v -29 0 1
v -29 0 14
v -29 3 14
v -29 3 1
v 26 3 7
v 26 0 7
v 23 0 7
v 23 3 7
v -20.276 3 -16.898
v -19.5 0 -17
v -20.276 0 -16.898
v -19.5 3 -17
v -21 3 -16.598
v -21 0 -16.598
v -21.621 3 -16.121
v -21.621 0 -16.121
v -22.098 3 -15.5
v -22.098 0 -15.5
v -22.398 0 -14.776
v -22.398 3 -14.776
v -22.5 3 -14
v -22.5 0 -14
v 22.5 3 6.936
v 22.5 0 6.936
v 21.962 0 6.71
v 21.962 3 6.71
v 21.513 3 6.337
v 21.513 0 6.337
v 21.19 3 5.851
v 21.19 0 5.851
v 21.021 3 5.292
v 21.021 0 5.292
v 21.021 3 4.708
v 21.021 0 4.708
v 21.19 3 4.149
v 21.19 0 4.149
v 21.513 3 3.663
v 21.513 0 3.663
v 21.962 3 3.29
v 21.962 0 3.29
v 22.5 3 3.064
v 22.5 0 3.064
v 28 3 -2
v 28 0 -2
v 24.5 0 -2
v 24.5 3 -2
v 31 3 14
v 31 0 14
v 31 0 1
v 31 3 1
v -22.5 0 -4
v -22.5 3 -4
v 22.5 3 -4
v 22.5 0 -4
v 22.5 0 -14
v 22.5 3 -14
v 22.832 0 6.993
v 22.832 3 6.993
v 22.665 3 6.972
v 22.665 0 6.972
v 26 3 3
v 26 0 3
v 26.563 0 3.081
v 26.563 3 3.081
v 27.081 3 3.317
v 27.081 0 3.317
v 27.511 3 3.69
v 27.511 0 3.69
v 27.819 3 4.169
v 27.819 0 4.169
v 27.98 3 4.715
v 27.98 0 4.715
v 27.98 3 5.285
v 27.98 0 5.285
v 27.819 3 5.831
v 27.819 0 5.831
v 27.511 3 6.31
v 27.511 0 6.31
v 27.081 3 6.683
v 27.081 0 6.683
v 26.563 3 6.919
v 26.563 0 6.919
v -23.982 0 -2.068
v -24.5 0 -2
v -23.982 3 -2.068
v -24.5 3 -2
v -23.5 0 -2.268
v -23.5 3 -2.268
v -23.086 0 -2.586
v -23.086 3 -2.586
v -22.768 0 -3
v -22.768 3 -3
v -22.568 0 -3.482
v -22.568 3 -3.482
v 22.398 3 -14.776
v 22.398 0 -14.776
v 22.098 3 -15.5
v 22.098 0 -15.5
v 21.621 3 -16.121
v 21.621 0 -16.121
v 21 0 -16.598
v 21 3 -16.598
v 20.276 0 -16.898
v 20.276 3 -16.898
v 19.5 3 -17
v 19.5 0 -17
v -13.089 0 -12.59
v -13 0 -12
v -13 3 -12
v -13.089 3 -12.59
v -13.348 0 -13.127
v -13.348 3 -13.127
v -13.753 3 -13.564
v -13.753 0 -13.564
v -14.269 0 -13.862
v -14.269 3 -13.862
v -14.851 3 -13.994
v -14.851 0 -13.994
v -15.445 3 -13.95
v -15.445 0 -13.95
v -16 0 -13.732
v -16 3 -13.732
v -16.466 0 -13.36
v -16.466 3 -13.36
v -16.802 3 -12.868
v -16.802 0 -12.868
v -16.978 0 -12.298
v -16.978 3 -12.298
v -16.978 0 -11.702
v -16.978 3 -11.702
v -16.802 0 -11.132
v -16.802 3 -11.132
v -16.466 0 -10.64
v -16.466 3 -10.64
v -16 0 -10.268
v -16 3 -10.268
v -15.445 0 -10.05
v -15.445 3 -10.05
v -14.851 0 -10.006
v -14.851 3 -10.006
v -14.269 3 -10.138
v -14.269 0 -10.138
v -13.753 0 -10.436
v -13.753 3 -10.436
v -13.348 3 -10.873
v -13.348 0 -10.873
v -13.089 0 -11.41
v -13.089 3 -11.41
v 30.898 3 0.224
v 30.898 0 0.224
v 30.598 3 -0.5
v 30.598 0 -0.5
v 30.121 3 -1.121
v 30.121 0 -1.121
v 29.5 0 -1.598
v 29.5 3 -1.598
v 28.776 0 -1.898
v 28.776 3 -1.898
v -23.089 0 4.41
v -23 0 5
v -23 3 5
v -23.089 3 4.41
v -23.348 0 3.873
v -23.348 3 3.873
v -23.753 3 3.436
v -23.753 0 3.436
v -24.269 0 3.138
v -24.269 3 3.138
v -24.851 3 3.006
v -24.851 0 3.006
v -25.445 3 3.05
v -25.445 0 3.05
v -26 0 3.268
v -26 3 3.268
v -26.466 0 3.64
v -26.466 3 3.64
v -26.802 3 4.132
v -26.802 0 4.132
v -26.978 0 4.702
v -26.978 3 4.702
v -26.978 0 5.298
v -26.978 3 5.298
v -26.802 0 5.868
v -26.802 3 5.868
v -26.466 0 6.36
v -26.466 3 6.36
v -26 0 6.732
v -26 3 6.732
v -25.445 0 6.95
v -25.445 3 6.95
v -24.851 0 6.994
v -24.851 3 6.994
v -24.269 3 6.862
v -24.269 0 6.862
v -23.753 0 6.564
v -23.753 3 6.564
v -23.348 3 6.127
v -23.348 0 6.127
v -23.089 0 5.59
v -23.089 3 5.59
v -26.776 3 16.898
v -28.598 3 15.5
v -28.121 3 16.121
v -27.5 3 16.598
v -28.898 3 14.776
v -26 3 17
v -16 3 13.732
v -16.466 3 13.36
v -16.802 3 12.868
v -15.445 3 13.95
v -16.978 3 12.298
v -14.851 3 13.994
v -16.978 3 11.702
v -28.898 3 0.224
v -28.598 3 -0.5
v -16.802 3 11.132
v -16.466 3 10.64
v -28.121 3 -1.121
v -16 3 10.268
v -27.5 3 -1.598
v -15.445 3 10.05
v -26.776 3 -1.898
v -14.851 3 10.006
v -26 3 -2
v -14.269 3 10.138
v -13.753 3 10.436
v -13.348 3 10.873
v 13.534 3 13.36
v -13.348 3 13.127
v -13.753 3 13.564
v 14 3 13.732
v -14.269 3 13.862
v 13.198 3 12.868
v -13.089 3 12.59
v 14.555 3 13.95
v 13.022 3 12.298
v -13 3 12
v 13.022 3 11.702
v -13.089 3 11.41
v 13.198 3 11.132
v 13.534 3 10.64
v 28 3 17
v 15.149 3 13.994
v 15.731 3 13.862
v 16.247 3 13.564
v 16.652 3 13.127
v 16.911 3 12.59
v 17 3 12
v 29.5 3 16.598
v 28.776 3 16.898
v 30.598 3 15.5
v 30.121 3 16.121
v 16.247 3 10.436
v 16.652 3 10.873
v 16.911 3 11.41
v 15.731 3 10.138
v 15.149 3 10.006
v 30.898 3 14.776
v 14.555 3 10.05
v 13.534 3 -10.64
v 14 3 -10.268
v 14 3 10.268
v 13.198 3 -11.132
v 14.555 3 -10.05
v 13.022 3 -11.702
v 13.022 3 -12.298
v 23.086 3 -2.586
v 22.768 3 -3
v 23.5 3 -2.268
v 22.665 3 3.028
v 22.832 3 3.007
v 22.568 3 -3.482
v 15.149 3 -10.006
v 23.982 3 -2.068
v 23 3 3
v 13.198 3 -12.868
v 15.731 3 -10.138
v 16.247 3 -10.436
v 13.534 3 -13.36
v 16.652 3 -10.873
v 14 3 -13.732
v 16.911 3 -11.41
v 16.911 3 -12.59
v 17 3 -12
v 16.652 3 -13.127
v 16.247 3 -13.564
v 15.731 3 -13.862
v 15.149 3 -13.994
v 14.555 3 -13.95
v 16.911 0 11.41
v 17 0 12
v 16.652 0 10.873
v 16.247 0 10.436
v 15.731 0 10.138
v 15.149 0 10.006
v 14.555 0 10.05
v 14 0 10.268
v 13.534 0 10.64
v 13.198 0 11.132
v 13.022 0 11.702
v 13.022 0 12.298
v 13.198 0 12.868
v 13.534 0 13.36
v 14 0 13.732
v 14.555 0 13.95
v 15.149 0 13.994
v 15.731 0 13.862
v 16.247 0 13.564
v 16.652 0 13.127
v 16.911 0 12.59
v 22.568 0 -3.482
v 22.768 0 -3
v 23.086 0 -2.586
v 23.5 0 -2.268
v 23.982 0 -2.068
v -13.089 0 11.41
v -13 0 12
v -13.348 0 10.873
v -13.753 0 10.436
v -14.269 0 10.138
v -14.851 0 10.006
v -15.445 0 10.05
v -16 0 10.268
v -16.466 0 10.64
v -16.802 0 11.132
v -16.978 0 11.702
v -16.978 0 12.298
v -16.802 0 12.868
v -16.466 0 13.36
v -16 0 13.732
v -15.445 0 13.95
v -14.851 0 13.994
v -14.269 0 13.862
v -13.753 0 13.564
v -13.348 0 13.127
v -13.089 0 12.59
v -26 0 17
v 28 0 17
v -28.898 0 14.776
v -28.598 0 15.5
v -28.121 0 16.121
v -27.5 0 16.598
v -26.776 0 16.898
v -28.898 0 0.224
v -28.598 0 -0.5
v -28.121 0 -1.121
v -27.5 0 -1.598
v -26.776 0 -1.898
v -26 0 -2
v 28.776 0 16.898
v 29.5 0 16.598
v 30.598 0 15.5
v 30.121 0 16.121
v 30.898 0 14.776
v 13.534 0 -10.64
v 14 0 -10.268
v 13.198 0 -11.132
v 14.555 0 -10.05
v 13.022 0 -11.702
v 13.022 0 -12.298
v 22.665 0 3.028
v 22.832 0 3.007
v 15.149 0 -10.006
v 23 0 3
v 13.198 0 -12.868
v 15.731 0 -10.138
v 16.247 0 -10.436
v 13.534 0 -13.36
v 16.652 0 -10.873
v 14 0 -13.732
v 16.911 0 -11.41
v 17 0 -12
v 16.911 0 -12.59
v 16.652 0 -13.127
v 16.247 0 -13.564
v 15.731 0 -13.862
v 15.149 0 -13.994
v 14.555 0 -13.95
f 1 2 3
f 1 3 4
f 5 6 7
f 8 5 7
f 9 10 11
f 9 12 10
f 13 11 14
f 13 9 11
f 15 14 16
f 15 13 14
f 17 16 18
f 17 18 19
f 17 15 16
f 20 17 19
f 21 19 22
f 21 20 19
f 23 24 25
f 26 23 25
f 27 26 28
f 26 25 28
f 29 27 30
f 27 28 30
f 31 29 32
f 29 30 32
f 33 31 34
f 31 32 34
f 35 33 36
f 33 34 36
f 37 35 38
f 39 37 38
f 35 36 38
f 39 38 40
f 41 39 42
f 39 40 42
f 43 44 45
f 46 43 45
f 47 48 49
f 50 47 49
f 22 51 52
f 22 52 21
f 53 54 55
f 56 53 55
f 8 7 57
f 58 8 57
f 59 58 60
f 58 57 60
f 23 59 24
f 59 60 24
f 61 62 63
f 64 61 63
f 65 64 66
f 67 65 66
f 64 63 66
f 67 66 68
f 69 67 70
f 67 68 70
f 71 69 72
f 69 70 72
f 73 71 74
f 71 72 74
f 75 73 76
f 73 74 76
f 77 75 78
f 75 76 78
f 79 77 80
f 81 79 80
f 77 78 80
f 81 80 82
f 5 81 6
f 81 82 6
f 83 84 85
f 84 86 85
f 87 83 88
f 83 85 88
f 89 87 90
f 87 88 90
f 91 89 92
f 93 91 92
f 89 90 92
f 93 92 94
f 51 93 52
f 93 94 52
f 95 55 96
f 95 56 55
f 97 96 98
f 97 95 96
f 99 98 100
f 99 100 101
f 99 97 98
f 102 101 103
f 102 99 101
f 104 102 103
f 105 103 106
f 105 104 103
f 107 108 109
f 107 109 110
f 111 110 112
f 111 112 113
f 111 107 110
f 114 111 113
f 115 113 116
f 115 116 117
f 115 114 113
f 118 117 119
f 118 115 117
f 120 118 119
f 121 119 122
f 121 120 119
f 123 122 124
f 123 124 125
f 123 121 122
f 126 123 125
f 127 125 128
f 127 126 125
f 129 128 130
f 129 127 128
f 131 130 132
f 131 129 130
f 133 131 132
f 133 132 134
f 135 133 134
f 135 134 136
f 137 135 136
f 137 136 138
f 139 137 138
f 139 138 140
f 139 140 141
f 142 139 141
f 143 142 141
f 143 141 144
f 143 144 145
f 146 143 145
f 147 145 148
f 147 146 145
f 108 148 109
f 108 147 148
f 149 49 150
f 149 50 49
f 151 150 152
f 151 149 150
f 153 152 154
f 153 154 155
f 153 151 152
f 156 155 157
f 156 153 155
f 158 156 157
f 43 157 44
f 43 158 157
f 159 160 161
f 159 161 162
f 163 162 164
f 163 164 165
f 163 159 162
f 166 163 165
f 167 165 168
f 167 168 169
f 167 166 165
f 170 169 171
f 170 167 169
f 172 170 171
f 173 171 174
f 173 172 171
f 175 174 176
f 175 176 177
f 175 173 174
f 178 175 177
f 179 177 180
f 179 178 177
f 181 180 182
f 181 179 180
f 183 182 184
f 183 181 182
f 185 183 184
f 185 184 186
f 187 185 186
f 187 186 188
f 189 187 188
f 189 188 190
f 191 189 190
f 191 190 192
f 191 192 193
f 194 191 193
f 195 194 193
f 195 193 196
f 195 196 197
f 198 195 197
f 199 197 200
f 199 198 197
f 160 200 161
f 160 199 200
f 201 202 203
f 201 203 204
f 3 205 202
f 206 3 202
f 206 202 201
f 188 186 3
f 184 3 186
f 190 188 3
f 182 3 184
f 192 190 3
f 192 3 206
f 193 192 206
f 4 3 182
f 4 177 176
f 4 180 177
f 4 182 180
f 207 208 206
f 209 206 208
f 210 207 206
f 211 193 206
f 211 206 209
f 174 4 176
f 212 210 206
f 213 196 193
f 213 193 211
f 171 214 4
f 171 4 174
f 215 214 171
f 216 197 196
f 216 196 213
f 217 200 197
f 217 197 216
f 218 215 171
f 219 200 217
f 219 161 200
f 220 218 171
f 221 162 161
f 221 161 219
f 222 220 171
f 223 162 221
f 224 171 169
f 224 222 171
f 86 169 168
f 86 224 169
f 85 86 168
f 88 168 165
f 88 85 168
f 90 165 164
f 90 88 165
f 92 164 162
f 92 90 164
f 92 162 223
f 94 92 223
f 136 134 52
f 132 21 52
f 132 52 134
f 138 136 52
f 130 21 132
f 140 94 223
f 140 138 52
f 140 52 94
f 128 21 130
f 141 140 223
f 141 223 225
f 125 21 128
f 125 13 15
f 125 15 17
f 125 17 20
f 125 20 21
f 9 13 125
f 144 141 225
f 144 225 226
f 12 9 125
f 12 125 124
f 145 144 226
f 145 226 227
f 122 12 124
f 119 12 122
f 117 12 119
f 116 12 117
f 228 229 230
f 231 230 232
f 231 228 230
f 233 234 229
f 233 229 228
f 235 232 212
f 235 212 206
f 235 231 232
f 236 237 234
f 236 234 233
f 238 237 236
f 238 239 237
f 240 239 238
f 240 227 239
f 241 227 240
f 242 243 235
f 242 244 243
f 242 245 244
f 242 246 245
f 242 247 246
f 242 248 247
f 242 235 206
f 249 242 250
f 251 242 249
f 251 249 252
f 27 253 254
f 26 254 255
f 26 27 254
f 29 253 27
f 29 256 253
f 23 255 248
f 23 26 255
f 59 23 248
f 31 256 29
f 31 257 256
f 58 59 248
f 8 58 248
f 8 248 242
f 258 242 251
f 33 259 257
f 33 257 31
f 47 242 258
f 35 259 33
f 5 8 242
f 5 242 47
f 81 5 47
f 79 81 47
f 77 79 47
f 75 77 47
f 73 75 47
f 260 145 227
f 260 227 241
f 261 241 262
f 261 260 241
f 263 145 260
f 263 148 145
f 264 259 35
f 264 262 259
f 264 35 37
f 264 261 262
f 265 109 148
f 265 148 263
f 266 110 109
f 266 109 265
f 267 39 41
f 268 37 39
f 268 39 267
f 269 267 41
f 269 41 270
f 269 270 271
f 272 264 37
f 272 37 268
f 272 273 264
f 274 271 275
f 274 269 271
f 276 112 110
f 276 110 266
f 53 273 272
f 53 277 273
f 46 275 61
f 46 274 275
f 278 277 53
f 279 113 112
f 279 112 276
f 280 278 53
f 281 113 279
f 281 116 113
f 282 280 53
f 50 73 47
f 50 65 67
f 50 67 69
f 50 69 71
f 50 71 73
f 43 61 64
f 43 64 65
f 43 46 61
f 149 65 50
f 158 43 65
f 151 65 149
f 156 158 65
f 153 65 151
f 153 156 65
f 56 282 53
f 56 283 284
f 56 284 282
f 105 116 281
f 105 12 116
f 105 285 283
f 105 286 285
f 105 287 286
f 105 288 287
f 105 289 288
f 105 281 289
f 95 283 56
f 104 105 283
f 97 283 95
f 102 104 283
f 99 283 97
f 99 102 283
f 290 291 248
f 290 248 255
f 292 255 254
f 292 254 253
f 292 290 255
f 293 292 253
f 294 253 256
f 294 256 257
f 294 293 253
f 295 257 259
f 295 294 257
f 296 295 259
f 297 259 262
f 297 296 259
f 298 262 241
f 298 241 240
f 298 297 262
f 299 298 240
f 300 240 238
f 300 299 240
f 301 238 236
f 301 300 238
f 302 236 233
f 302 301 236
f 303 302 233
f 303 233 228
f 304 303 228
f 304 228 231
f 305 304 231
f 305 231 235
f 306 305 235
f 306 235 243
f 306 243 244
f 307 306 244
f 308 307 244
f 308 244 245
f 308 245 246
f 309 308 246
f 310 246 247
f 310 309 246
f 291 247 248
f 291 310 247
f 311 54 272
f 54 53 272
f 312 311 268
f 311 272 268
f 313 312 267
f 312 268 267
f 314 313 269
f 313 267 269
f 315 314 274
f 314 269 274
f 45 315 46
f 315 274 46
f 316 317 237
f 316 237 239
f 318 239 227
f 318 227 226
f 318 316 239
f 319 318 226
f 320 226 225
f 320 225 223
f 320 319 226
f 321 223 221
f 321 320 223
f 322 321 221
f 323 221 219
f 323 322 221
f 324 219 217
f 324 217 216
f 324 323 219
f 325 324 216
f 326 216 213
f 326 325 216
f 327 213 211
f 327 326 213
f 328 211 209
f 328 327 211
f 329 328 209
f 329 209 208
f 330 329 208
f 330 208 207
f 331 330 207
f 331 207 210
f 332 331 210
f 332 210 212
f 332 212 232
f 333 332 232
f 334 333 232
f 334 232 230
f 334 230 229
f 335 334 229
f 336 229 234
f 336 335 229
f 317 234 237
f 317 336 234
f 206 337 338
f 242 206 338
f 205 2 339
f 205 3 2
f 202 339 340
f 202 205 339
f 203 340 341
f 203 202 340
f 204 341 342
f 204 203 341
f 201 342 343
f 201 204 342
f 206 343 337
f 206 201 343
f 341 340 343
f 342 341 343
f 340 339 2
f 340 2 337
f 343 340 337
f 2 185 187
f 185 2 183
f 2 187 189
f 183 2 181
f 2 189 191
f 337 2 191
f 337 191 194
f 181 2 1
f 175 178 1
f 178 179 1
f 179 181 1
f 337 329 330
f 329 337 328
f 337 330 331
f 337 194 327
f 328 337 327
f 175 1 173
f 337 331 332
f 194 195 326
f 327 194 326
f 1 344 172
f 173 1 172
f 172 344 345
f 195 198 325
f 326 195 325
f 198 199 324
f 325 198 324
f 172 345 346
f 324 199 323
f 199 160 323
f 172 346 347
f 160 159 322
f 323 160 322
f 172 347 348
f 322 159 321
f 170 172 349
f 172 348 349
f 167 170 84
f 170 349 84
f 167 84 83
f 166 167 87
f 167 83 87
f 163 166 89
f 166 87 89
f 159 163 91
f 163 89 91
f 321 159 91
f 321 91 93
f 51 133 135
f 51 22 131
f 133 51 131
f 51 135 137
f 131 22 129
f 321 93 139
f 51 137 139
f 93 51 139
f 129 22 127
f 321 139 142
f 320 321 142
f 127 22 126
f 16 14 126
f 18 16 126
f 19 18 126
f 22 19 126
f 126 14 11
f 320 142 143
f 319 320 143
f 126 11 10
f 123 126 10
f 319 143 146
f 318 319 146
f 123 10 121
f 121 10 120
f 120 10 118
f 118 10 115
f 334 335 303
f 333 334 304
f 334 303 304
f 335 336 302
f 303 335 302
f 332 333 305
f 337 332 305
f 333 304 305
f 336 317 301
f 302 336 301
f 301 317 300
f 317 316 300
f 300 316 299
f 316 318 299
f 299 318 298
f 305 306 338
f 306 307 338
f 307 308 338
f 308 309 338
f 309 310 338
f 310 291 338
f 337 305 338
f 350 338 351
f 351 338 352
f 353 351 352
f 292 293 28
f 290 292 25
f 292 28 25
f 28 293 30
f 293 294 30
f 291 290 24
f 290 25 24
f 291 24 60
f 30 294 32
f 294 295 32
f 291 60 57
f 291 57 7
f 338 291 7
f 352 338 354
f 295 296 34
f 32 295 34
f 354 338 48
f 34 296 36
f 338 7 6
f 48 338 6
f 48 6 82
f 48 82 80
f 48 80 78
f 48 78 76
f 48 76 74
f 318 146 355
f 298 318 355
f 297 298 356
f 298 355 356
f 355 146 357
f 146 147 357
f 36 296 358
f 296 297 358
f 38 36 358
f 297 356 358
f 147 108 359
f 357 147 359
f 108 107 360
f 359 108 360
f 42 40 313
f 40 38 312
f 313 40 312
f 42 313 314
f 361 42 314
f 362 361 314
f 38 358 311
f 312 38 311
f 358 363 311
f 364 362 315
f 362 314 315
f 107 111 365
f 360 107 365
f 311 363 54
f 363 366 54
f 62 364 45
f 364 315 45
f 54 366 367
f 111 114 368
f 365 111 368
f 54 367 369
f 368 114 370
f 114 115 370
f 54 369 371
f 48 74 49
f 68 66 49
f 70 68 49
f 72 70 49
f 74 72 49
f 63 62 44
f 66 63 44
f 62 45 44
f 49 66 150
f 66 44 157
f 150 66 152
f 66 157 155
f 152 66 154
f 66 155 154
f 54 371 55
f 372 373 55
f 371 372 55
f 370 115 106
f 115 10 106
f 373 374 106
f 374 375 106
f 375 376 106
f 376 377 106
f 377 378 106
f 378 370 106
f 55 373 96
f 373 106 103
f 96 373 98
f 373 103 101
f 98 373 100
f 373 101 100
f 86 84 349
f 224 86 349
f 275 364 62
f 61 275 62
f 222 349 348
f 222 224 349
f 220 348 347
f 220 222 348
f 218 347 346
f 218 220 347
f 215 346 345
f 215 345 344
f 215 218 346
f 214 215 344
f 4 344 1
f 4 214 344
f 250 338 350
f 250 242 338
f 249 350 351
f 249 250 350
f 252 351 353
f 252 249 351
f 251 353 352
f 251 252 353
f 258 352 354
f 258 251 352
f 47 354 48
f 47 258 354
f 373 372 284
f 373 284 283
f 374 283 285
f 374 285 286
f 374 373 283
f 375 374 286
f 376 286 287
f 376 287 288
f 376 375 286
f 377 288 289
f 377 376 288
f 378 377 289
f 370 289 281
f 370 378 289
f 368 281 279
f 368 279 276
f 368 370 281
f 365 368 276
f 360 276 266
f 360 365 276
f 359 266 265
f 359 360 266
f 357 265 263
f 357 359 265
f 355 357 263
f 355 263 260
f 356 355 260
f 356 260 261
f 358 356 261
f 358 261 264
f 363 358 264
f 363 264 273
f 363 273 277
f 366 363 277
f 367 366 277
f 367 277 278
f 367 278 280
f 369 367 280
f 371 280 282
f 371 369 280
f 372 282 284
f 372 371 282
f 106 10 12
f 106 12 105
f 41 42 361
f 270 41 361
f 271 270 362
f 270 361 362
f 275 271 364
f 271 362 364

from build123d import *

# Parameters (mm, degrees)
SKETCH1_R           = 2
SKETCH1_W           = 6.5
SKETCH1_H           = 19
SKETCH1_W_2         = 45
SKETCH1_H_2         = 15
BOSS_EXTRUDE1_DEPTH = 3
FILLET1_R           = 3
FILLET2_R           = 2


with BuildPart() as part:
    # Sketch1 → Boss-Extrude1 (new body)
    with BuildSketch(Plane(origin=(0, 0, 0), x_dir=(1, 0, 0), z_dir=(0, 1, 0))):
        with BuildLine():
            Line((-22.5, 2), (-22.5, -17))
            Line((-22.5, -17), (22.5, -17))
            Line((22.5, -17), (22.5, -6.936491673))
            ThreePointArc((22.5, -6.936491673), (21, -5), (22.5, -3.063508327))
            Line((22.5, -3.063508327), (22.5, 2))
            Line((22.5, 2), (-22.5, 2))
        make_face()
        with Locations((-15, -12)):
            Circle(SKETCH1_R, mode=Mode.SUBTRACT)
        with Locations((15, -12)):
            Circle(SKETCH1_R, mode=Mode.SUBTRACT)
        with Locations((-25.75, -7.5)):
            Rectangle(SKETCH1_W, SKETCH1_H)
        with Locations((-25, -5)):
            Circle(SKETCH1_R, mode=Mode.SUBTRACT)
        with Locations((0, 9.5)):
            Rectangle(SKETCH1_W_2, SKETCH1_H_2)
        with Locations((-15, 12)):
            Circle(SKETCH1_R, mode=Mode.SUBTRACT)
        with Locations((15, 12)):
            Circle(SKETCH1_R, mode=Mode.SUBTRACT)
        with BuildLine():
            Line((22.5, -6.936491673), (22.5, -17))
            Line((22.5, -17), (31, -17))
            Line((31, -17), (31, 2))
            Line((31, 2), (22.5, 2))
            Line((22.5, 2), (22.5, -3.063508327))
            ThreePointArc((22.5, -3.063508327), (22.747991415, -3.015940607), (23, -3))
            Line((23, -3), (26, -3))
            ThreePointArc((26, -3), (28, -5), (26, -7))
            Line((26, -7), (23, -7))
            ThreePointArc((23, -7), (22.747991415, -6.984059393), (22.5, -6.936491673))
        make_face()
    extrude(amount=BOSS_EXTRUDE1_DEPTH)

    # Fillet1
    fillet1_edges = [part.edges().sort_by_distance(p)[0] for p in [
        (31, 1.5, -2),
        (31, 1.5, 17),
        (-29, 1.5, 17),
        (-29, 1.5, -2),
        (-22.5, 1.5, -17),
        (22.5, 1.5, -17),
    ]]
    fillet(fillet1_edges, radius=FILLET1_R)

    # Fillet2
    fillet2_edges = [part.edges().sort_by_distance(p)[0] for p in [
        (-22.5, 1.5, -2),
        (22.5, 1.5, -2),
    ]]
    fillet(fillet2_edges, radius=FILLET2_R)


solid = part.part
